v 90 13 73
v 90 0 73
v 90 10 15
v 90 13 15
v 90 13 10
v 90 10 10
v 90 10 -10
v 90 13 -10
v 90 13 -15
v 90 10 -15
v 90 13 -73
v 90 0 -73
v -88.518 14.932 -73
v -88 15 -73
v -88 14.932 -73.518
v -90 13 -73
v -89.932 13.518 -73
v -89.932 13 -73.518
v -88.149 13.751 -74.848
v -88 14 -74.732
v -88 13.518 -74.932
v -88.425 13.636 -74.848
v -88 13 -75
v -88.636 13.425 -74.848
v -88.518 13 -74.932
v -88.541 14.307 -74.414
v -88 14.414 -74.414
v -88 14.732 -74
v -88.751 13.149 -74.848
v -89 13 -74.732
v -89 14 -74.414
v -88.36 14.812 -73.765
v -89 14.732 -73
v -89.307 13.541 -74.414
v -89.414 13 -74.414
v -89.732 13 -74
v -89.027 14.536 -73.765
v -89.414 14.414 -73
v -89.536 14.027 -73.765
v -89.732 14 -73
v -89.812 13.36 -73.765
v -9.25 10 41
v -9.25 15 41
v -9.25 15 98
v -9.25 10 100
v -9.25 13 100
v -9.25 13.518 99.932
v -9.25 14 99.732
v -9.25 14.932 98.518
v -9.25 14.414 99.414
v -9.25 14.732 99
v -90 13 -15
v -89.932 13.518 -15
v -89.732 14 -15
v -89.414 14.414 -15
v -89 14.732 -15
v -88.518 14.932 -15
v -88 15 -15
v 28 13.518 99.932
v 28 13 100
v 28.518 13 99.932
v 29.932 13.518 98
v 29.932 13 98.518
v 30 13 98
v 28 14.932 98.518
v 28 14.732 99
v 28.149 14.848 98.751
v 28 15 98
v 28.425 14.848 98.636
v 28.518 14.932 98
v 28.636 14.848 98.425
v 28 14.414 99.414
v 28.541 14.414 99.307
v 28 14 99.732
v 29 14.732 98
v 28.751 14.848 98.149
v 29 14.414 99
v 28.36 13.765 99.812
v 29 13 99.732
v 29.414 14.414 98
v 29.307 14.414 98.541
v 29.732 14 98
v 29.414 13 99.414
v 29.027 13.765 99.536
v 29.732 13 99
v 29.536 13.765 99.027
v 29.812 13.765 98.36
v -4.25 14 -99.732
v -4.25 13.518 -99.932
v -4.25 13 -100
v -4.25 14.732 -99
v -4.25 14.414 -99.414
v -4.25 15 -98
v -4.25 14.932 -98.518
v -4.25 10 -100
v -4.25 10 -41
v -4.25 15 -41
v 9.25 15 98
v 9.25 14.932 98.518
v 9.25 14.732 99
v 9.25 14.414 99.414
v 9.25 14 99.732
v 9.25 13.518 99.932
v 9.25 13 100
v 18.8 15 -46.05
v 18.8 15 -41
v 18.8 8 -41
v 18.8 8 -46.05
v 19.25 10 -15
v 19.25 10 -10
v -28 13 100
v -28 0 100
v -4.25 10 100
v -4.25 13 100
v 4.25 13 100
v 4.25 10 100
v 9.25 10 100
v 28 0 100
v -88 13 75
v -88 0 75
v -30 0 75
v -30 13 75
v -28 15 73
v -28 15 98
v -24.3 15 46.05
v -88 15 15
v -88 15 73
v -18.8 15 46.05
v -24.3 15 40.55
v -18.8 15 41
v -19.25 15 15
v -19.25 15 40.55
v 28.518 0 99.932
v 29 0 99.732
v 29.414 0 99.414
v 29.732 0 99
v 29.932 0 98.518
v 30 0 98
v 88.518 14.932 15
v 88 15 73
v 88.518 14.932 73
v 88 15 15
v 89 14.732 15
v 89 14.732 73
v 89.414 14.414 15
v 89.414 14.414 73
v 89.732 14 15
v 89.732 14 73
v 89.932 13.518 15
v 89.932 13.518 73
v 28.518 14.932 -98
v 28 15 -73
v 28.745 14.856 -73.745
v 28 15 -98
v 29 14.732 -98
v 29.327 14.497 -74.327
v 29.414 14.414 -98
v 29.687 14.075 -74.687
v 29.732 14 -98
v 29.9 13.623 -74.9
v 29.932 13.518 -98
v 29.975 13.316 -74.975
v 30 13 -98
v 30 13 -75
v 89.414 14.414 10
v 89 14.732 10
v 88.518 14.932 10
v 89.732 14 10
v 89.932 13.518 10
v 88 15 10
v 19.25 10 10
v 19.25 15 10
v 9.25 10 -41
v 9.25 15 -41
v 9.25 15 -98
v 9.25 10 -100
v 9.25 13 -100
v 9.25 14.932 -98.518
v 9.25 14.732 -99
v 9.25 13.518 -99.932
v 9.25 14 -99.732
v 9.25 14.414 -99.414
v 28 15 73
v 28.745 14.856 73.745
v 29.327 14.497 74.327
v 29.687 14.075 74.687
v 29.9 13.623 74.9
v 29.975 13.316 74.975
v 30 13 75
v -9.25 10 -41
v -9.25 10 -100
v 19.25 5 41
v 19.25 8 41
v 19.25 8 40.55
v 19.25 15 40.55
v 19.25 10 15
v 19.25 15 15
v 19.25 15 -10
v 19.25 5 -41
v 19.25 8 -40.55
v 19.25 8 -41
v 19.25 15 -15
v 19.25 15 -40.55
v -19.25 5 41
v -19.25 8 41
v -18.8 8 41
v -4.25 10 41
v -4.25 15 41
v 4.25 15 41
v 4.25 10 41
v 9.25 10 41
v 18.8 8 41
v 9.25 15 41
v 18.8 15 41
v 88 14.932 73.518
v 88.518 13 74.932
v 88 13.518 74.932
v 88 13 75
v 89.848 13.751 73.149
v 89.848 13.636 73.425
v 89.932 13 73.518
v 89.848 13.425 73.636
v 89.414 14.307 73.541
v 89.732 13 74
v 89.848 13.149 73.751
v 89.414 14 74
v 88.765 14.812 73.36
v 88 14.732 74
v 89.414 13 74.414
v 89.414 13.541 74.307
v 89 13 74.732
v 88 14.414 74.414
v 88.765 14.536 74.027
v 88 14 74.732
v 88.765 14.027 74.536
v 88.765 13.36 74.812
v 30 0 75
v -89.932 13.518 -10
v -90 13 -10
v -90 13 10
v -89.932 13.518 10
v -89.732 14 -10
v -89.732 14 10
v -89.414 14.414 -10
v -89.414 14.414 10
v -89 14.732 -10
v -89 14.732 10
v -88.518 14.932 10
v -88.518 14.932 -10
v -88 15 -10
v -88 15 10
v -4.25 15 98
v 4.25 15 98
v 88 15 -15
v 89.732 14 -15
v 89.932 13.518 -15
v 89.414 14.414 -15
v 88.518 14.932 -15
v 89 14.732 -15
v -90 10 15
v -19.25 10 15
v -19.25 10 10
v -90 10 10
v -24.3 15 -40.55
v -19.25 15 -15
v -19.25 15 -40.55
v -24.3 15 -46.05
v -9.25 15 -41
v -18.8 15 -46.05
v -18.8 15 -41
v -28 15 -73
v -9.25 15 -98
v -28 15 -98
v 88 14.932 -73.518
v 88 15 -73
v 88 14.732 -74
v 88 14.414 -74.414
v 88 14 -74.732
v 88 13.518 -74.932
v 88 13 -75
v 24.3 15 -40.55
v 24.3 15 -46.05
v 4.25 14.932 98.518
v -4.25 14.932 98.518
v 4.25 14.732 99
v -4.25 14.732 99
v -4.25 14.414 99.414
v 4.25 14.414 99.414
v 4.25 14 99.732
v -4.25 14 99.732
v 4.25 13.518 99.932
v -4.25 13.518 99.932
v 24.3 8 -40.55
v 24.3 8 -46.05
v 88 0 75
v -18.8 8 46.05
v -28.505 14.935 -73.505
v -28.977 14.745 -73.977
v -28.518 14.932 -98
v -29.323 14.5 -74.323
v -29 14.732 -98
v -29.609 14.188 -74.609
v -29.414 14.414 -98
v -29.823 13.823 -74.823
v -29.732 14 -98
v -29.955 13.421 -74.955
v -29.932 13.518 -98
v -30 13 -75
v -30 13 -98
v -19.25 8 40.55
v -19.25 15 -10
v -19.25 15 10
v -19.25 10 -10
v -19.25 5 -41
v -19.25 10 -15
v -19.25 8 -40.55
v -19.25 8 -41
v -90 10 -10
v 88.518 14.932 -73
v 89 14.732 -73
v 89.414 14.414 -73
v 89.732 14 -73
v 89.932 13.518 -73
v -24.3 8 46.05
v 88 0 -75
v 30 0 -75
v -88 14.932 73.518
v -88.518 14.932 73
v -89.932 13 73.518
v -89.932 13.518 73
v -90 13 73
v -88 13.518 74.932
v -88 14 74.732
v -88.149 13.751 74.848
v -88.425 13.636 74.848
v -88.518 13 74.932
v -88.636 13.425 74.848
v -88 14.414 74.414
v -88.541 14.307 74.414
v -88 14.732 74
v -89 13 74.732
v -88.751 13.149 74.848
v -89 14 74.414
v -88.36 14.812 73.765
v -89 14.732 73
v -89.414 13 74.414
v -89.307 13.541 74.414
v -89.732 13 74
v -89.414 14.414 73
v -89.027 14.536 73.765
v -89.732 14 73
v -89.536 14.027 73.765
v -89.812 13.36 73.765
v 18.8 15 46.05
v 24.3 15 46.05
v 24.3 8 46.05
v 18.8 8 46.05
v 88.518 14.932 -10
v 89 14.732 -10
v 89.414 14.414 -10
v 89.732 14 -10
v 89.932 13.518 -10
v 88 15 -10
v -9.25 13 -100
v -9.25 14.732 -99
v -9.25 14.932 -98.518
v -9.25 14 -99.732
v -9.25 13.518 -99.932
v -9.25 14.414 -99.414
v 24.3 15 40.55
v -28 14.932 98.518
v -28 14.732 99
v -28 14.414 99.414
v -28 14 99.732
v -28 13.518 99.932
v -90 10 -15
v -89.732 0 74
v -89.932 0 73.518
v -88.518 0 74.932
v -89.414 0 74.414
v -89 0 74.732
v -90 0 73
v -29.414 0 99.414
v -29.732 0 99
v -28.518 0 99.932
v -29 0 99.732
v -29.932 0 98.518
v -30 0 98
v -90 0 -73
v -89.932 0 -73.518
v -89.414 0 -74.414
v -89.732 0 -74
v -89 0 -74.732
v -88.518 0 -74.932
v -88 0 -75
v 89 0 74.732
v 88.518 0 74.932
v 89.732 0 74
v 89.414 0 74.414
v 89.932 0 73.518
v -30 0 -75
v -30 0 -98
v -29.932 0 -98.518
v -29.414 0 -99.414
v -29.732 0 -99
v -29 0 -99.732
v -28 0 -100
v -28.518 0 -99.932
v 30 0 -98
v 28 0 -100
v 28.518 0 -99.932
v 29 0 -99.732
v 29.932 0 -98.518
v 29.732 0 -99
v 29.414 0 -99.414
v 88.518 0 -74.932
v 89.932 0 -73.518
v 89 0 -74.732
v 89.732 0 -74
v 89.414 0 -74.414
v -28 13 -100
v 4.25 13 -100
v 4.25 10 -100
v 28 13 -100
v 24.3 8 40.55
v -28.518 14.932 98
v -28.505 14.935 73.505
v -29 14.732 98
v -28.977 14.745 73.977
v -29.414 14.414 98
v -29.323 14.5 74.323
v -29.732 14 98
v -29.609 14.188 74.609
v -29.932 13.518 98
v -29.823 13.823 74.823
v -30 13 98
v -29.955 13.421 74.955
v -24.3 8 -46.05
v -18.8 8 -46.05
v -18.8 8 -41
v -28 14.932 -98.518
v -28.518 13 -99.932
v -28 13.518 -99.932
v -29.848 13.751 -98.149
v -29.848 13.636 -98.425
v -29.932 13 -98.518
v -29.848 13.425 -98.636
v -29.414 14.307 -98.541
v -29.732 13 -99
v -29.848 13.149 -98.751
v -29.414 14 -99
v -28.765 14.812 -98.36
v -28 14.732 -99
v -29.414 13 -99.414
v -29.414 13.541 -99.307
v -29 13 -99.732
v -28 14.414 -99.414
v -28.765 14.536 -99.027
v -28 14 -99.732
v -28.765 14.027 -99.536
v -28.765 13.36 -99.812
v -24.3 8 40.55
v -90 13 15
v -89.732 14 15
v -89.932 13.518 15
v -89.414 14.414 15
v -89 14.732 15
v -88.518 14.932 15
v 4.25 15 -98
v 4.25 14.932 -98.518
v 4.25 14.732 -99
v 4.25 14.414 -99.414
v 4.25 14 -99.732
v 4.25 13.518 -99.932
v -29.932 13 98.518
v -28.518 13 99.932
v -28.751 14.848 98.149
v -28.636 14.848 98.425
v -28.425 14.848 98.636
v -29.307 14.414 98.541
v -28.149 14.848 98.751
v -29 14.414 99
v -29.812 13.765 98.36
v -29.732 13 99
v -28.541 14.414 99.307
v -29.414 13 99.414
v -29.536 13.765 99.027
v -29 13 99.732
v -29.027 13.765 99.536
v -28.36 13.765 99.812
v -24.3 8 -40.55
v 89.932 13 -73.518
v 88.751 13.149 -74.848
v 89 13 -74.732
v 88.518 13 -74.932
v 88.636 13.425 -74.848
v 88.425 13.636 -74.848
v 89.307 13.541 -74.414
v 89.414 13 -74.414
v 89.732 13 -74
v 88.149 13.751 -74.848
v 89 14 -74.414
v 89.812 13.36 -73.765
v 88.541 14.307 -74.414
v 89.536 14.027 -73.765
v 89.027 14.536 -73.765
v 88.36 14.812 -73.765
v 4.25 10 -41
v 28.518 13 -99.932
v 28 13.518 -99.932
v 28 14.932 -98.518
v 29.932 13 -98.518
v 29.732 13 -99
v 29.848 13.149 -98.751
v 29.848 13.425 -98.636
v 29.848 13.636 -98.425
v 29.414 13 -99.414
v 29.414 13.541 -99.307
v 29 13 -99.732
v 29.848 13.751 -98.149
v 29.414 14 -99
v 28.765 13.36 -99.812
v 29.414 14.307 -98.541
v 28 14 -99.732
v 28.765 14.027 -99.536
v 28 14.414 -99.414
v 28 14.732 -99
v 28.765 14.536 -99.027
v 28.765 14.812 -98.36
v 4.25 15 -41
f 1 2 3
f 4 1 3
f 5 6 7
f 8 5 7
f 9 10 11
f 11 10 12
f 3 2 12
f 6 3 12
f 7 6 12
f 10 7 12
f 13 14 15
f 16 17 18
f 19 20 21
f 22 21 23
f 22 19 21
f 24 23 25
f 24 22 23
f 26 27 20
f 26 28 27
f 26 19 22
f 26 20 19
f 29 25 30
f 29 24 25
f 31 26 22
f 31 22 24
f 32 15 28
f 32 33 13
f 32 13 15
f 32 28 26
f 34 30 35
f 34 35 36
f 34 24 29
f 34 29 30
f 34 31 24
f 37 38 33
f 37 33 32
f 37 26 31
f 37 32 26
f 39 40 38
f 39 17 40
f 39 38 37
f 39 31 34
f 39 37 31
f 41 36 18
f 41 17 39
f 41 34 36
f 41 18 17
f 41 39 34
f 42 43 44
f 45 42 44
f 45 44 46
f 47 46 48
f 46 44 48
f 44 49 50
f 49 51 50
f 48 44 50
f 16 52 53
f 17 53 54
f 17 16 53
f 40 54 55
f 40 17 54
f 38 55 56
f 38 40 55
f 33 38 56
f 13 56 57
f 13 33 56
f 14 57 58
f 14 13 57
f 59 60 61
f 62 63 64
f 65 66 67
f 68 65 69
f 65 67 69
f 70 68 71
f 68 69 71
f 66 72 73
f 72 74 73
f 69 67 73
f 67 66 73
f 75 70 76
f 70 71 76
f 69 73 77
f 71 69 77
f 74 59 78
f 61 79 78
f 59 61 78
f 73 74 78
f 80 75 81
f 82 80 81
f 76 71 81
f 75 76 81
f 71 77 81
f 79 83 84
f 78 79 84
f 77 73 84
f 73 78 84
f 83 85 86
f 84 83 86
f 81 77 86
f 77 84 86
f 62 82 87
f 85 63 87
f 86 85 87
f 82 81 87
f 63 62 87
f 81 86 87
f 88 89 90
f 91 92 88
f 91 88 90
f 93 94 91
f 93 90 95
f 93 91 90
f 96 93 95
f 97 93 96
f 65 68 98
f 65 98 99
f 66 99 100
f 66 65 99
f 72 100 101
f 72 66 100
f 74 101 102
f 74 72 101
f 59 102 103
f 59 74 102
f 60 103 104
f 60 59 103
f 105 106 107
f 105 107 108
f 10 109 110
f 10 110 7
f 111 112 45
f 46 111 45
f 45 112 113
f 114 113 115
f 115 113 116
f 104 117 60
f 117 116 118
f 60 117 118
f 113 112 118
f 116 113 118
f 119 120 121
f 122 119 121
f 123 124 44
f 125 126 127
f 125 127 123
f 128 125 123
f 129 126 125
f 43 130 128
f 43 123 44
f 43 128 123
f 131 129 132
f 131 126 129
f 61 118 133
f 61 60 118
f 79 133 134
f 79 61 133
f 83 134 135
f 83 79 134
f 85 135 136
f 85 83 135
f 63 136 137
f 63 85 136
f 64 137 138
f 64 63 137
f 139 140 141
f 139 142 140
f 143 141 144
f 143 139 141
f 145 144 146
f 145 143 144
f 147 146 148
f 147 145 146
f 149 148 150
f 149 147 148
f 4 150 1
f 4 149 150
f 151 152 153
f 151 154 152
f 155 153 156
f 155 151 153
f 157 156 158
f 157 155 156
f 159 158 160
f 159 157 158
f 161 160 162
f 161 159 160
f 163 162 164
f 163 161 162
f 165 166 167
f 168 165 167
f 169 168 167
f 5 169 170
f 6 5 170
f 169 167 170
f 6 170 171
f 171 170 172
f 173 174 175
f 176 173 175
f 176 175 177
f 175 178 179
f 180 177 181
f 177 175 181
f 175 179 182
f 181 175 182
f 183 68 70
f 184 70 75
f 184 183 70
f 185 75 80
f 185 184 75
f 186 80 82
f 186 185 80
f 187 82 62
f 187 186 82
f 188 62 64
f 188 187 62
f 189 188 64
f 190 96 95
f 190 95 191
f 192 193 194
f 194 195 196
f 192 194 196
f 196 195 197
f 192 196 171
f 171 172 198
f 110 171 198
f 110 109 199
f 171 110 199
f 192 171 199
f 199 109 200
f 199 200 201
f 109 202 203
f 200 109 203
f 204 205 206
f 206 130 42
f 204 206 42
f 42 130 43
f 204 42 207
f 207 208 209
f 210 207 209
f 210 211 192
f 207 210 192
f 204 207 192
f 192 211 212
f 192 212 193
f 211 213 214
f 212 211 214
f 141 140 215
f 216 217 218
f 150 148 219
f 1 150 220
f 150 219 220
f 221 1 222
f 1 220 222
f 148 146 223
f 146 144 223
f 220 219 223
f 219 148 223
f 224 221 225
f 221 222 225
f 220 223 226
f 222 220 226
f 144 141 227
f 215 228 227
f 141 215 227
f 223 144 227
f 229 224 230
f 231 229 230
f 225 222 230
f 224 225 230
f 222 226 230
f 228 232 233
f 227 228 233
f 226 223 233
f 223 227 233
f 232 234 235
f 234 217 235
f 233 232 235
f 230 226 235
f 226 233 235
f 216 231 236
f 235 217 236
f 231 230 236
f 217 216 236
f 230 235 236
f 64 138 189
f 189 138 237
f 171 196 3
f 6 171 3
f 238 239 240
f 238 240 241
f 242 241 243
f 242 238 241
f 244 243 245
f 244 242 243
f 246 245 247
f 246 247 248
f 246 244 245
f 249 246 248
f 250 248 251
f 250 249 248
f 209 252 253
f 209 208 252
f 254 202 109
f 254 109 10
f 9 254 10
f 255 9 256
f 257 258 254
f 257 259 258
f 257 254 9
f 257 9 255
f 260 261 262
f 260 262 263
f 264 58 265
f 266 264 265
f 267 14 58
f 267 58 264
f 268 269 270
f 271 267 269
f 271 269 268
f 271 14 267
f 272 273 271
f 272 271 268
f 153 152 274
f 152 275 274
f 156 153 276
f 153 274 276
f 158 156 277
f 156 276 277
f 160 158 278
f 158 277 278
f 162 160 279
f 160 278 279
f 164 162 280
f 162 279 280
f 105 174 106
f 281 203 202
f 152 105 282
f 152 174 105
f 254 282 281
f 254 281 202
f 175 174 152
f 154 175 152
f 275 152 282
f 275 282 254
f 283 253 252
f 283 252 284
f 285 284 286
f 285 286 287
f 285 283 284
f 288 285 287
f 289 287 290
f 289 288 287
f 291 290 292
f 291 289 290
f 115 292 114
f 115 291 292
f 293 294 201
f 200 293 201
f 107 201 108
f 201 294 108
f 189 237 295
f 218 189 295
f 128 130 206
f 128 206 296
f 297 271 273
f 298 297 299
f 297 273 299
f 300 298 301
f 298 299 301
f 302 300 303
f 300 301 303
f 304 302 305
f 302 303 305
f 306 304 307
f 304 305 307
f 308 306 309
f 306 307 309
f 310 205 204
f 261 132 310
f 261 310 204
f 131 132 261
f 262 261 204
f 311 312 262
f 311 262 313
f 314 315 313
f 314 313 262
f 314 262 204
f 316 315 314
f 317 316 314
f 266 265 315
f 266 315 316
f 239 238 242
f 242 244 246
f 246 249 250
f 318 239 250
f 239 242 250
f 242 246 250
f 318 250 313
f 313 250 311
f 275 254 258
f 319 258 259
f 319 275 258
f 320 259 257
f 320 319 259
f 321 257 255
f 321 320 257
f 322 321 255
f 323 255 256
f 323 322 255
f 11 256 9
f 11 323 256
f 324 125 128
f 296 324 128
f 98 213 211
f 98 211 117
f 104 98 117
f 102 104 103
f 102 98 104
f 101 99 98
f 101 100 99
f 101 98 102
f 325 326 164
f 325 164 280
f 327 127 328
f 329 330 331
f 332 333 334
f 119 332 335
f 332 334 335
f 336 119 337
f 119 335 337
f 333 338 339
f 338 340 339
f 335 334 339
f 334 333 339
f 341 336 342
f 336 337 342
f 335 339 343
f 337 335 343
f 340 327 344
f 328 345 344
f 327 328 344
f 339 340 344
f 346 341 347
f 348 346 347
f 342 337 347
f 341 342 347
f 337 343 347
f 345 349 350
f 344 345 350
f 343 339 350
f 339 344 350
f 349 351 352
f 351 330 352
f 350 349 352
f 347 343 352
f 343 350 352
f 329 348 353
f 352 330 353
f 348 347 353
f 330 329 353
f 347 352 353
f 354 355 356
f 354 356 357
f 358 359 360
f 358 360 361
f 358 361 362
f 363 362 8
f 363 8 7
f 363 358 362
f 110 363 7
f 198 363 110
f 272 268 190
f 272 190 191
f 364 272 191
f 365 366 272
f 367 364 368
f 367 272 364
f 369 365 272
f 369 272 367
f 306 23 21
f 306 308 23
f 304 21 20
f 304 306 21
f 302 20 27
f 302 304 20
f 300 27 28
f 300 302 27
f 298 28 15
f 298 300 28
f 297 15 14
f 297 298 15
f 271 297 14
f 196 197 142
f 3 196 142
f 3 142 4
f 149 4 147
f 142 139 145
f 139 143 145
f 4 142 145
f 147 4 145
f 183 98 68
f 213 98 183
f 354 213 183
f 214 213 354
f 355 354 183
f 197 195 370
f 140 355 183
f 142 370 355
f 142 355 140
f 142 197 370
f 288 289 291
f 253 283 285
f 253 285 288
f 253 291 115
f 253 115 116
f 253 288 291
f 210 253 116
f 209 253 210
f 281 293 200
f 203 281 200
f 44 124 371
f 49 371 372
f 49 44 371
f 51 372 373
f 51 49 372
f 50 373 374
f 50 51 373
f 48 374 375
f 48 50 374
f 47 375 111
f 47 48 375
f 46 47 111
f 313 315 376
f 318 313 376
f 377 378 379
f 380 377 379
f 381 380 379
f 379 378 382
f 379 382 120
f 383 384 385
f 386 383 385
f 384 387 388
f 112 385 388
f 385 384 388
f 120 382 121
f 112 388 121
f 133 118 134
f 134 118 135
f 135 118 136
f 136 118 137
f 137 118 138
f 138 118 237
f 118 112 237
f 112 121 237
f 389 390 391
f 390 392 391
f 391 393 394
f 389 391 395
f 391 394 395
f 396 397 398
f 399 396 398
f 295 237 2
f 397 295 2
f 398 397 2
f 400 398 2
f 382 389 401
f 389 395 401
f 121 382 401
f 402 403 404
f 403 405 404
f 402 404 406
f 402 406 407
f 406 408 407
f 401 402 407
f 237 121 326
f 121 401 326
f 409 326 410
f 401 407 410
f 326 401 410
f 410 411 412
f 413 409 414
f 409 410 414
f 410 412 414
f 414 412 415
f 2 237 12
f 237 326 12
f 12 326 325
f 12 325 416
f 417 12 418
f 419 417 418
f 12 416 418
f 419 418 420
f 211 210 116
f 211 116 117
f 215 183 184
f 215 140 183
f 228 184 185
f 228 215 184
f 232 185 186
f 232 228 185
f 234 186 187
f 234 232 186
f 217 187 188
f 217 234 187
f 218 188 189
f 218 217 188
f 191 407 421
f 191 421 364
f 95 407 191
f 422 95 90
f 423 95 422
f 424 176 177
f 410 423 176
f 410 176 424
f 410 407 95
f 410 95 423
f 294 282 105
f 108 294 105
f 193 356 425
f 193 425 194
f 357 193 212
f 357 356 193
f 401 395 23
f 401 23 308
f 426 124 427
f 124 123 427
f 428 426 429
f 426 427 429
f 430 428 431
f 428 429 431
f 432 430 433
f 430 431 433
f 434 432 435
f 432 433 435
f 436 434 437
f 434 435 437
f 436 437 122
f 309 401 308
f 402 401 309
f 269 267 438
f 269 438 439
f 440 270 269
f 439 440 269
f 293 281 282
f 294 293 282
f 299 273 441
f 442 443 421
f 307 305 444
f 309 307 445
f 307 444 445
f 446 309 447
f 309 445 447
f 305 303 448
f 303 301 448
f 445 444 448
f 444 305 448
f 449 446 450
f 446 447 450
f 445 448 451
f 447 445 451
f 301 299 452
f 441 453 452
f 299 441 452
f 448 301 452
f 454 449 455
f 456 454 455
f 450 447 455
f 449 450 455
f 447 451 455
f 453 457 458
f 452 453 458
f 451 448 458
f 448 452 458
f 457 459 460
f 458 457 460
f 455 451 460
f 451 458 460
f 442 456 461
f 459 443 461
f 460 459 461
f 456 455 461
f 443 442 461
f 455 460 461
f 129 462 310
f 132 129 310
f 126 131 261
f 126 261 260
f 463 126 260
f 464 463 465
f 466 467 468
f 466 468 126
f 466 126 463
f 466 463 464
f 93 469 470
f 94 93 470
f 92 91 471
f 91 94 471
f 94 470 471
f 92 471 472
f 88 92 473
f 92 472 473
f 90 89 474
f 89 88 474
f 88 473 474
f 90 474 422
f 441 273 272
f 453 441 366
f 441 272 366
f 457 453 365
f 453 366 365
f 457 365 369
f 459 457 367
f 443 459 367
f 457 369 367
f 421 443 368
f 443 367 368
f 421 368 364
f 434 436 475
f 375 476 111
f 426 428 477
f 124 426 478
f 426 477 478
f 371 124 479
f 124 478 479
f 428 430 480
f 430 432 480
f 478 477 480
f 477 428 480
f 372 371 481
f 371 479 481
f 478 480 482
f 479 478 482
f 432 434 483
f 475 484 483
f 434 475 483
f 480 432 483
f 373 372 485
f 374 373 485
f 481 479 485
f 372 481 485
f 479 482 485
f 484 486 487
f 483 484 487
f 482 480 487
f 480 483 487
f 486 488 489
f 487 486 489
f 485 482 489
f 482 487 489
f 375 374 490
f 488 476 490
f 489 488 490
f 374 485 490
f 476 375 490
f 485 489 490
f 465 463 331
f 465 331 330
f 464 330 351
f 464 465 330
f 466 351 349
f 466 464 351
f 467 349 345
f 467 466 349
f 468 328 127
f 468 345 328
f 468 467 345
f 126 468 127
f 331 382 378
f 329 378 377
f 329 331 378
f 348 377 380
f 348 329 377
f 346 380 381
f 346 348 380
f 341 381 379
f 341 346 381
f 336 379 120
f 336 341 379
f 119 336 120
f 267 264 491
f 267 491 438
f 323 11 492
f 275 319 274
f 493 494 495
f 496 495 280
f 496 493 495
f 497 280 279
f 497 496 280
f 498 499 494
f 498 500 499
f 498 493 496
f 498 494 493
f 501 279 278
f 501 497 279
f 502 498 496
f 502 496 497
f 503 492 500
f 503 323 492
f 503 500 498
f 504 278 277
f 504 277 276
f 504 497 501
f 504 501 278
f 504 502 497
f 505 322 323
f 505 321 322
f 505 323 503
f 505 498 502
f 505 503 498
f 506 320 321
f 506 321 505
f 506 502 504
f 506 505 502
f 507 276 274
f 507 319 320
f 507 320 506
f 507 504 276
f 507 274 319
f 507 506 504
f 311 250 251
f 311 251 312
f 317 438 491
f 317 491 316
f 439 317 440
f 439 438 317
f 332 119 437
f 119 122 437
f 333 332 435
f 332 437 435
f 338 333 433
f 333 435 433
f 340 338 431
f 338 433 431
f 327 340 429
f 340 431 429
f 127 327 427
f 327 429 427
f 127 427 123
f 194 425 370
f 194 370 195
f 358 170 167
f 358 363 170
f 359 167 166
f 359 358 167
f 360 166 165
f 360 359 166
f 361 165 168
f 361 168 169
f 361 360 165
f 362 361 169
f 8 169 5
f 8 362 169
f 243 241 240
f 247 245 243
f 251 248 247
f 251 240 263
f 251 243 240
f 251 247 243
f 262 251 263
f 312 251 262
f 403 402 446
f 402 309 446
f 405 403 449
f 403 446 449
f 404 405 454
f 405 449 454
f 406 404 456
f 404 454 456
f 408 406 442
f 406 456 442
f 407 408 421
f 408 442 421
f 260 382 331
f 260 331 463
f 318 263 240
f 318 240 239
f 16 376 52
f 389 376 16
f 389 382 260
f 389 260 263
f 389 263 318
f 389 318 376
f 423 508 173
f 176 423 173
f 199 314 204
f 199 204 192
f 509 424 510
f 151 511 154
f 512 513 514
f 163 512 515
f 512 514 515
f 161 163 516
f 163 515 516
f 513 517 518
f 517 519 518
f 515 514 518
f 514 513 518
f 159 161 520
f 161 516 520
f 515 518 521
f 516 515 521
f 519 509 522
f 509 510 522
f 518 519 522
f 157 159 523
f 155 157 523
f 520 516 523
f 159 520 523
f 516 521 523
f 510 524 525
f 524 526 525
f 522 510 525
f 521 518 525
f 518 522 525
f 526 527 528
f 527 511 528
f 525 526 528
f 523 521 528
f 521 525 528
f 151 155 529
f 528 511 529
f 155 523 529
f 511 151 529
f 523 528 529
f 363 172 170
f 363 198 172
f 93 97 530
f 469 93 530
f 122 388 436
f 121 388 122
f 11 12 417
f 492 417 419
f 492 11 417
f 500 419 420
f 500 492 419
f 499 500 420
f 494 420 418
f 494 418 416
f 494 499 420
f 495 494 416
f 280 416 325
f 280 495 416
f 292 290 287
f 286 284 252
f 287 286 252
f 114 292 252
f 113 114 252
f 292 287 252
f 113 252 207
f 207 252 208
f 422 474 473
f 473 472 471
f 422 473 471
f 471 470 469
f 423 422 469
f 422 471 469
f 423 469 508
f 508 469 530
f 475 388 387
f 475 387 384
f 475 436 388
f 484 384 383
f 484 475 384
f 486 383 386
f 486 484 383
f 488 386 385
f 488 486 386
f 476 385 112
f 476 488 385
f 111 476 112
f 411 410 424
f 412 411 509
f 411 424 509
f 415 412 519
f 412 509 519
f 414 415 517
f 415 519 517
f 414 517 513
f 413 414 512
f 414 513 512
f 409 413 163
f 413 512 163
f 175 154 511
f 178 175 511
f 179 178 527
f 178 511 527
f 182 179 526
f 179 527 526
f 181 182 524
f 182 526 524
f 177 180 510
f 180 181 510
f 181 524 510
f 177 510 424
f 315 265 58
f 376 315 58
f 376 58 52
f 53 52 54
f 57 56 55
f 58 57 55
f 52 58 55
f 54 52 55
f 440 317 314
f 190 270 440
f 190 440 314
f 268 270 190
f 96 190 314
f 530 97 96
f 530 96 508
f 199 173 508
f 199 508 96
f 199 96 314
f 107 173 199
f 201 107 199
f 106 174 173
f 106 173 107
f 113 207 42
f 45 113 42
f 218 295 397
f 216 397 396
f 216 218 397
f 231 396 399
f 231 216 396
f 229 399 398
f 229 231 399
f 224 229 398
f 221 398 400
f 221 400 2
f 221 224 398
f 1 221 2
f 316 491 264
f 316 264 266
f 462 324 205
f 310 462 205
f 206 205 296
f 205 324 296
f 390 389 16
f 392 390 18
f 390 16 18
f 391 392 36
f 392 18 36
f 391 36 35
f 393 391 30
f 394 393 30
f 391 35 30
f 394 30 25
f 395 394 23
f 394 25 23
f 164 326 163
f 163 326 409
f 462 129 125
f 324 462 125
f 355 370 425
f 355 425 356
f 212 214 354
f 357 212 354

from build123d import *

# Parameters (mm, degrees)
SKETCH1_W                                  = 180
SKETCH1_H                                  = 150
BOSS_EXTRUDE1_DEPTH                        = 15
SKETCH7_W                                  = 60
SKETCH7_H                                  = 25
BOSS_EXTRUDE6_DEPTH                        = 15
FILLET1_R                                  = 2
SKETCH2_W                                  = 38.5
SKETCH2_H                                  = 82
CUT_EXTRUDE1_DEPTH                         = 10
CUT_EXTRUDE3_DEPTH                         = 5
SKETCH11_W                                 = 5.5
SKETCH11_H                                 = 5.5
CUT_EXTRUDE6_DEPTH                         = 7
MIRROR3_AT_THE_SECOND_PLANE_COPY_1_SKETC_W = 5.5
MIRROR3_AT_THE_SECOND_PLANE_COPY_1_SKETC_H = 5.5
MIRROR3_AT_THE_SECOND_PLANE_COPY_1_DEPTH   = 7
MIRROR4_AT_THE_SECOND_PLANE_COPY_1_DEPTH   = 5


with BuildPart() as part:
    # Sketch1 → Boss-Extrude1 (new body)
    with BuildSketch(Plane(origin=(0, 0, 0), x_dir=(1, 0, 0), z_dir=(0, 1, 0))):
        Rectangle(SKETCH1_W, SKETCH1_H)
    extrude(amount=BOSS_EXTRUDE1_DEPTH)

    # Sketch7 → Boss-Extrude6 (add)
    with BuildSketch(Plane(origin=(0, 0, 0), x_dir=(1, 0, 0), z_dir=(0, 1, 0))):
        with Locations((0, -87.5)):
            Rectangle(SKETCH7_W, SKETCH7_H)
        with Locations((0, 87.5)):
            Rectangle(SKETCH7_W, SKETCH7_H)
    extrude(amount=BOSS_EXTRUDE6_DEPTH)

    # Fillet1
    fillet1_edges = [part.edges().sort_by_distance(p)[0] for p in [
        (-90, 15, 0),
        (60, 15, 75),
        (-60, 15, 75),
        (-30, 7.5, 100),
        (30, 7.5, 100),
        (-30, 15, 87.5),
        (0, 15, 100),
        (30, 15, 87.5),
        (-60, 15, -75),
        (0, 15, -100),
        (30, 7.5, -100),
        (-30, 15, -87.5),
        (-30, 7.5, -100),
        (30, 15, -87.5),
        (90, 15, 0),
        (90, 7.5, 75),
        (-90, 7.5, 75),
        (-90, 7.5, -75),
        (90, 7.5, -75),
        (60, 15, -75),
    ]]
    fillet(fillet1_edges, radius=FILLET1_R)

    # Sketch2 → Cut-Extrude1 (cut)
    with BuildSketch(Plane(origin=(0, 15, 0), x_dir=(1, 0, 0), z_dir=(0, 1, 0))):
        Rectangle(SKETCH2_W, SKETCH2_H)
    extrude(amount=-CUT_EXTRUDE1_DEPTH, mode=Mode.SUBTRACT)

    # Sketch10 → Cut-Extrude3 (cut)
    with BuildSketch(Plane(origin=(0, 15, 0), x_dir=(1, 0, 0), z_dir=(0, 1, 0))):
        Polygon((-9.25, -40.5), (-9.25, -33.162899401), (-4.25, -33.162899401), (-4.25, -40.5), (-4.25, -105.687952047), (-9.25, -105.687952047), align=None)
        Polygon((-99.022946063, 15), (-19.25, 15), (-11.555108838, 15), (-11.555108838, 10), (-19.25, 10), (-99.022946063, 10), align=None)
    cut_extrude3 = extrude(amount=-CUT_EXTRUDE3_DEPTH, mode=Mode.SUBTRACT)

    # Sketch11 → Cut-Extrude6 (cut)
    with BuildSketch(Plane(origin=(0, 15, 0), x_dir=(1, 0, 0), z_dir=(0, 1, 0))):
        with Locations((-21.549732367, 43.299732367)):
            Rectangle(SKETCH11_W, SKETCH11_H)
    cut_extrude6 = extrude(amount=-CUT_EXTRUDE6_DEPTH, mode=Mode.SUBTRACT)

    # Mirror3: Cut-Extrude6 across plane
    add(cut_extrude6.mirror(Plane(origin=(0, 0, 0), x_dir=(0, 0, 1), z_dir=(1, 0, 0))), mode=Mode.SUBTRACT)

    # Mirror3 at the second plane: Cut-Extrude6 across plane
    add(cut_extrude6.mirror(Plane.XY), mode=Mode.SUBTRACT)

    # Mirror3 at the second plane copy 1 sketc → Mirror3 at the second plane copy 1 (cut)
    with BuildSketch(Plane(origin=(0, 15, 0), x_dir=(-1, 0, 0), z_dir=(0, 1, 0))):
        with Locations((-21.549732367, 43.299732367)):
            Rectangle(MIRROR3_AT_THE_SECOND_PLANE_COPY_1_SKETC_W, MIRROR3_AT_THE_SECOND_PLANE_COPY_1_SKETC_H)
    extrude(amount=-MIRROR3_AT_THE_SECOND_PLANE_COPY_1_DEPTH, mode=Mode.SUBTRACT)

    # Mirror4: Cut-Extrude3 across plane
    add(cut_extrude3.mirror(Plane(origin=(0, 0, 0), x_dir=(0, 0, 1), z_dir=(1, 0, 0))), mode=Mode.SUBTRACT)

    # Mirror4 at the second plane: Cut-Extrude3 across plane
    add(cut_extrude3.mirror(Plane.XY), mode=Mode.SUBTRACT)

    # Mirror4 at the second plane copy 1 sketc → Mirror4 at the second plane copy 1 (cut)
    with BuildSketch(Plane(origin=(0, 15, 0), x_dir=(-1, 0, 0), z_dir=(0, 1, 0))):
        Polygon((-9.25, -40.5), (-9.25, -33.162899401), (-4.25, -33.162899401), (-4.25, -40.5), (-4.25, -105.687952047), (-9.25, -105.687952047), align=None)
        Polygon((-99.022946063, 15), (-19.25, 15), (-11.555108838, 15), (-11.555108838, 10), (-19.25, 10), (-99.022946063, 10), align=None)
    extrude(amount=-MIRROR4_AT_THE_SECOND_PLANE_COPY_1_DEPTH, mode=Mode.SUBTRACT)


solid = part.part
